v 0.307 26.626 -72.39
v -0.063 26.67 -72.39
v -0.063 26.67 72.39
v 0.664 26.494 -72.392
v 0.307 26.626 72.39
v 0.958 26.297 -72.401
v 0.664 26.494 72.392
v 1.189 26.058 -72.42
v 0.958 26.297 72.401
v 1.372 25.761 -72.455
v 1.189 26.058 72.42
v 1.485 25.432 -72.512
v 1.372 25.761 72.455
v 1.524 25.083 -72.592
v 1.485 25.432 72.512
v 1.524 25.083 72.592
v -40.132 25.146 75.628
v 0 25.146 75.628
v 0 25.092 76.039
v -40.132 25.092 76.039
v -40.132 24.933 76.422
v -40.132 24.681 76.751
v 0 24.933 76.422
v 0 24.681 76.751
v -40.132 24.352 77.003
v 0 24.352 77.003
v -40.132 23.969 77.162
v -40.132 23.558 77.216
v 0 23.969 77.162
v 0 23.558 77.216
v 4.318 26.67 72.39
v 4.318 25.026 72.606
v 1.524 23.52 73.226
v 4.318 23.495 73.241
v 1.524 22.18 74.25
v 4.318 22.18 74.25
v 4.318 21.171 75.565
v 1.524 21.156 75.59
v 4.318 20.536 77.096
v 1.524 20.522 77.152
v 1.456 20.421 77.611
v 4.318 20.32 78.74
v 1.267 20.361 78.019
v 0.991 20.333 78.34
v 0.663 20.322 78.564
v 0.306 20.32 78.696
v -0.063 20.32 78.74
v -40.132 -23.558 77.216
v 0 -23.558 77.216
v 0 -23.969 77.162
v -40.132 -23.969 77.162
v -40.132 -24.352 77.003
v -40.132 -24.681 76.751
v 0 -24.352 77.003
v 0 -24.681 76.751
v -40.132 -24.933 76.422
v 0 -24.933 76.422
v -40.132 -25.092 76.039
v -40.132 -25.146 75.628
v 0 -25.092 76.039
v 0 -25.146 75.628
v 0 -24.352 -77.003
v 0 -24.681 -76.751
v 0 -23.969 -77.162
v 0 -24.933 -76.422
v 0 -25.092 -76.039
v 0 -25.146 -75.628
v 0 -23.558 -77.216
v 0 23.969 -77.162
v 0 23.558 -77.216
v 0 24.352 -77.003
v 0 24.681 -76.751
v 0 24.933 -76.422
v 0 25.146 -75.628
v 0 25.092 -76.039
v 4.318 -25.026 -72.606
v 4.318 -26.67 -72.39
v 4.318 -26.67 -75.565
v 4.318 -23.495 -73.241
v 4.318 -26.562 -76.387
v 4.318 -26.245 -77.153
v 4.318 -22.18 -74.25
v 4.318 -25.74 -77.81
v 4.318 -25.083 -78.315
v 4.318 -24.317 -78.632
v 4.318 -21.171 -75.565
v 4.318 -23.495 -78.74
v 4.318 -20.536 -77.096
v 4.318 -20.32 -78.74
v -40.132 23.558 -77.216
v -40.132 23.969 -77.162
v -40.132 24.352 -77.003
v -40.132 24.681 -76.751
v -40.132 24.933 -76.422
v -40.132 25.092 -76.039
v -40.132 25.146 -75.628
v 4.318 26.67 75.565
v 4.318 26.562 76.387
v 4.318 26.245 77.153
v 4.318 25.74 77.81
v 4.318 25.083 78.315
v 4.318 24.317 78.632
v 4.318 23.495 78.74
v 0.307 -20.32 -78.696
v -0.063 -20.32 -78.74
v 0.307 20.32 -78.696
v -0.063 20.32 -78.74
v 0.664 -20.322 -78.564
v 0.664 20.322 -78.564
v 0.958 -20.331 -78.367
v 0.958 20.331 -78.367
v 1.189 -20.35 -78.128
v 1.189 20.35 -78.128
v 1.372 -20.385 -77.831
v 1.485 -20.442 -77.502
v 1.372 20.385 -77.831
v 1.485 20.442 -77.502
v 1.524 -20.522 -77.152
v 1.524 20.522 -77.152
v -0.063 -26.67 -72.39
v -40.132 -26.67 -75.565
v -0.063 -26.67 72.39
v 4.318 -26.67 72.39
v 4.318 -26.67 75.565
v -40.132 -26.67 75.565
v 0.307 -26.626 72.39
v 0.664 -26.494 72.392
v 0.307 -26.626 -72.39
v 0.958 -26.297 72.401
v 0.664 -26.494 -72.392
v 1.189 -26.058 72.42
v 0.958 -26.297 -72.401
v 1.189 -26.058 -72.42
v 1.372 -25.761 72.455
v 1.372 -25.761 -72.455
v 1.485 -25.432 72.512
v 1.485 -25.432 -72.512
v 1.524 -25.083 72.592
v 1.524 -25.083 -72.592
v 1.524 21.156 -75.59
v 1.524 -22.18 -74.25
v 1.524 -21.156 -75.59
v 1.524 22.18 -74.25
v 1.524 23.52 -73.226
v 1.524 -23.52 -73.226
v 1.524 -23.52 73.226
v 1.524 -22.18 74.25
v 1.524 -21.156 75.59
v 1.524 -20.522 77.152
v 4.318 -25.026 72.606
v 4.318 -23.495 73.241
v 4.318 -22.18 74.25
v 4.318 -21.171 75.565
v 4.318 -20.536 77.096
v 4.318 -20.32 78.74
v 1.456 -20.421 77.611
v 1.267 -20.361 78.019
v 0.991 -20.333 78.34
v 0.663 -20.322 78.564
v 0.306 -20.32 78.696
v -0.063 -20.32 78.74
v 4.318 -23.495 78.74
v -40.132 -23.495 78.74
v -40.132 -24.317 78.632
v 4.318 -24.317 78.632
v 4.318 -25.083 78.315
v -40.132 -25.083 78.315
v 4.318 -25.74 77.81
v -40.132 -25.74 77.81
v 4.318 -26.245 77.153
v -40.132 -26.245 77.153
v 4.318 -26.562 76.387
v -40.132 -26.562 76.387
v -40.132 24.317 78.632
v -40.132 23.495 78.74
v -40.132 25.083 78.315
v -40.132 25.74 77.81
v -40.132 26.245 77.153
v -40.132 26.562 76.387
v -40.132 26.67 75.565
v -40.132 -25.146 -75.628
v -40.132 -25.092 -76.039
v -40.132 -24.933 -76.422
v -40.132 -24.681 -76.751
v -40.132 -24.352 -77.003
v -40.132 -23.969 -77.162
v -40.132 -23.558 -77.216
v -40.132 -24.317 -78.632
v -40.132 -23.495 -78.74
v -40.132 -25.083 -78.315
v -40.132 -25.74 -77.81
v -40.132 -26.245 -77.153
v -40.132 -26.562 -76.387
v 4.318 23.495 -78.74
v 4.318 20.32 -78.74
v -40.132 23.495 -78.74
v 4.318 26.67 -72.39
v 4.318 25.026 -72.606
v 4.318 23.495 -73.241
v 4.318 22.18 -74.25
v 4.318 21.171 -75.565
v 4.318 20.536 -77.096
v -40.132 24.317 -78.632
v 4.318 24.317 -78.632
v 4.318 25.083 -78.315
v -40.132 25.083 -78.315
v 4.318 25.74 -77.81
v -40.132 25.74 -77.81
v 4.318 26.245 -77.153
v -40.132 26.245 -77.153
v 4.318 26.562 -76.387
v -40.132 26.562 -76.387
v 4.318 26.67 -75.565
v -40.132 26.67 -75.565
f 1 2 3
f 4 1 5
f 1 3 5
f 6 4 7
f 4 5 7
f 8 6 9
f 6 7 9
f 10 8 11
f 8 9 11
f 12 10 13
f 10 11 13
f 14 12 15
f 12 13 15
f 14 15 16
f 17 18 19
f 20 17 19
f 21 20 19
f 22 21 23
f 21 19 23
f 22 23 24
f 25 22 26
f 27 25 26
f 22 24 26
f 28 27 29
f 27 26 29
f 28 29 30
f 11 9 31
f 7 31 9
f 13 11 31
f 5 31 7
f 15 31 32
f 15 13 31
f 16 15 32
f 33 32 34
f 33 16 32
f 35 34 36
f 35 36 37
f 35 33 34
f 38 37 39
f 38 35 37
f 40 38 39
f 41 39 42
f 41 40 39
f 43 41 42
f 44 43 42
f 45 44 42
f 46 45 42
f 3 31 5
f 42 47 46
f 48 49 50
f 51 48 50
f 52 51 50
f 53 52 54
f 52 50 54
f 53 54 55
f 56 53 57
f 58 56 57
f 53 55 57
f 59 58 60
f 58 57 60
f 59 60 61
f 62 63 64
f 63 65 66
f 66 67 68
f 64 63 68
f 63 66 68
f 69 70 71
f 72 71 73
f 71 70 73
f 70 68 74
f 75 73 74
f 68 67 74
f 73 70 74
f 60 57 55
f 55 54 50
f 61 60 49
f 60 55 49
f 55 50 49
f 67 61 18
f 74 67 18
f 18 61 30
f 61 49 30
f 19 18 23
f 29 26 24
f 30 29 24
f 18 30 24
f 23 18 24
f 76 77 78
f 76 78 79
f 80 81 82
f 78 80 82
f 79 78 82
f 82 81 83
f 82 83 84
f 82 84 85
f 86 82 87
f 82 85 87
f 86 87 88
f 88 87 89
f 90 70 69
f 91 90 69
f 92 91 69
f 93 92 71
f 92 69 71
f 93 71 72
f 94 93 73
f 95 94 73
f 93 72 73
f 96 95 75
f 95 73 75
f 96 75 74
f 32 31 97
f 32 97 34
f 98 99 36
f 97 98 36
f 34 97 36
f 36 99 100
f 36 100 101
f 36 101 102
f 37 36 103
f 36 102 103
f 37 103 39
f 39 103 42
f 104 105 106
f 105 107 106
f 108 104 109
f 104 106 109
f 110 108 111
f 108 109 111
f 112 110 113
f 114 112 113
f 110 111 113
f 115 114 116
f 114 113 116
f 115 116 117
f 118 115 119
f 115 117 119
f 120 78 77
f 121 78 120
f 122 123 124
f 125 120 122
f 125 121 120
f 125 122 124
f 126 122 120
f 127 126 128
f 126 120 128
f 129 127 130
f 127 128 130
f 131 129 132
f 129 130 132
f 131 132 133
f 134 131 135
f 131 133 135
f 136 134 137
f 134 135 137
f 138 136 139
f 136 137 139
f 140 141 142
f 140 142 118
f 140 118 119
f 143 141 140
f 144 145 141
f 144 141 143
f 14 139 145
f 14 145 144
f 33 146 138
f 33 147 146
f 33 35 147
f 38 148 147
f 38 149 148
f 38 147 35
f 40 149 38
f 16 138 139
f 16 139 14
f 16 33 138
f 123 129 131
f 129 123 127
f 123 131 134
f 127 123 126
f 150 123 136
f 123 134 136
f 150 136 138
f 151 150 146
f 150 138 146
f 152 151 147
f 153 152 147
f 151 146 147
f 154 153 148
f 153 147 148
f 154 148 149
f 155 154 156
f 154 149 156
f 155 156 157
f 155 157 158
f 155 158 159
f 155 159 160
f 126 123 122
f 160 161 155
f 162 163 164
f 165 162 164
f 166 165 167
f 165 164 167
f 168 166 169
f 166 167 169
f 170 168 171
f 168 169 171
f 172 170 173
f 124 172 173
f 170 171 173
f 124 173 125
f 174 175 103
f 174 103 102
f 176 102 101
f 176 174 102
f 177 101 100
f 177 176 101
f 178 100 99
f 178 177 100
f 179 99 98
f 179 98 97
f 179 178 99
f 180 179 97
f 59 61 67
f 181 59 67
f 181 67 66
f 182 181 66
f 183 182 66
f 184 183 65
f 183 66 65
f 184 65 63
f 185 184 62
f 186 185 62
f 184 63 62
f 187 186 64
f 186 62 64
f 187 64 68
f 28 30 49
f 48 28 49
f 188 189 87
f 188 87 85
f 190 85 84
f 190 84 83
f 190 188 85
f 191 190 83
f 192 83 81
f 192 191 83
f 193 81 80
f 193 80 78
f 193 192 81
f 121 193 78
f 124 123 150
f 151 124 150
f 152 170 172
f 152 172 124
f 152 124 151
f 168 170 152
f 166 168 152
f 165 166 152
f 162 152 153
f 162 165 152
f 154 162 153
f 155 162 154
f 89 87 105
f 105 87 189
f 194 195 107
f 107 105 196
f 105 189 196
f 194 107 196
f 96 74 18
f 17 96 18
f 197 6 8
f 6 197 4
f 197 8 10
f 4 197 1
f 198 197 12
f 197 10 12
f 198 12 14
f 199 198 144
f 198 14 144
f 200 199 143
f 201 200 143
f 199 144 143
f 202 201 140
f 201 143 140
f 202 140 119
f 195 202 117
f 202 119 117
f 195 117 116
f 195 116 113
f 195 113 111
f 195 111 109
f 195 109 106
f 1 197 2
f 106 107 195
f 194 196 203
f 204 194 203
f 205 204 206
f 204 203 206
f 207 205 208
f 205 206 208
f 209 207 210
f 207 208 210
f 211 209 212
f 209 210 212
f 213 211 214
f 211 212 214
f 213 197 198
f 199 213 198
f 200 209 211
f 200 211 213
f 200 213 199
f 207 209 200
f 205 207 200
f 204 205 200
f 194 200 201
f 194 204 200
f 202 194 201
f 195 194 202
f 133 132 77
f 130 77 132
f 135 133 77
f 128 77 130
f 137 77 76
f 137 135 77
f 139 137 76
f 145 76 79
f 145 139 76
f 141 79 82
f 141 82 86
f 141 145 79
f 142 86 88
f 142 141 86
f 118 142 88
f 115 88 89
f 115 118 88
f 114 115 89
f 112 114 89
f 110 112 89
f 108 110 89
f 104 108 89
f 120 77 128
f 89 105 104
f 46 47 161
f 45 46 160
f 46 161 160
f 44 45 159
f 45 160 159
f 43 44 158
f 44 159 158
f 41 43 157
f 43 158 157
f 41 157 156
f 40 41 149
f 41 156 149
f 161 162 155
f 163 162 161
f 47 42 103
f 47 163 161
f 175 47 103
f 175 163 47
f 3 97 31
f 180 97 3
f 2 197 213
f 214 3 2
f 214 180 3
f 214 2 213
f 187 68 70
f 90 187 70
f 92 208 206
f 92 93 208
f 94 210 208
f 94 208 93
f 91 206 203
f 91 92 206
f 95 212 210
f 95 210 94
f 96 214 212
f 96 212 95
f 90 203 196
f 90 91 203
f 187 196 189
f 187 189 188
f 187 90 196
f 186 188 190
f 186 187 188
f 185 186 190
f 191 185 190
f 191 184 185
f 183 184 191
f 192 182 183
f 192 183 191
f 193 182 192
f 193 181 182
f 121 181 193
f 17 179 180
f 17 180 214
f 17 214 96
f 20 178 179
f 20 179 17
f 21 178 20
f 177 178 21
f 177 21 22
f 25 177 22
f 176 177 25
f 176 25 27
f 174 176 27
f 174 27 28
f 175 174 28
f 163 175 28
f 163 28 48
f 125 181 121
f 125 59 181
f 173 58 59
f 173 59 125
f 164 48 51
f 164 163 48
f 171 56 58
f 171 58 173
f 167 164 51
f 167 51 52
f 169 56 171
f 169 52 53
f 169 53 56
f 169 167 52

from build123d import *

# Parameters (mm, degrees)
F1_DEPTH = 1.524
F3_DEPTH = 40.132
F5_DEPTH = 2.794
F8_R     = 1.5875
F9_R     = 1.5875
F10_R    = 1.5875
F11_R    = 1.5875


with BuildPart() as f1:
    # F0 (on Right) → F1 (new body)
    with BuildSketch(Plane.YZ):
        with BuildLine():
            ThreePointArc((26.67, 75.565), (25.7400640303, 77.8100640303), (23.495, 78.74))
            Line((23.495, 78.74), (-23.495, 78.74))
            ThreePointArc((-23.495, 78.74), (-25.7400640303, 77.8100640303), (-26.67, 75.565))
            Line((-26.67, 75.565), (-26.67, -75.565))
            ThreePointArc((-26.67, -75.565), (-25.7400640303, -77.8100640303), (-23.495, -78.74))
            Line((-23.495, -78.74), (23.495, -78.74))
            ThreePointArc((23.495, -78.74), (25.7400640303, -77.8100640303), (26.67, -75.565))
            Line((26.67, -75.565), (26.67, 75.565))
        make_face()
    extrude(amount=F1_DEPTH)

    # F2 (on face) → F3 (join)
    with BuildSketch(Plane(origin=(0, 0, 0), x_dir=(0, -1, 0), z_dir=(-1, 0, 0))):
        with BuildLine():
            Line((23.495, 78.74), (-23.495, 78.74))
            ThreePointArc((-23.495, 78.74), (-25.7400640303, 77.8100640303), (-26.67, 75.565))
            Line((-26.67, 75.565), (-26.67, -75.565))
            ThreePointArc((-26.67, -75.565), (-25.7400640303, -77.8100640303), (-23.495, -78.74))
            Line((-23.495, -78.74), (23.495, -78.74))
            ThreePointArc((23.495, -78.74), (25.7400640303, -77.8100640303), (26.67, -75.565))
            Line((26.67, -75.565), (26.67, 75.565))
            ThreePointArc((26.67, 75.565), (25.7400640303, 77.8100640303), (23.495, 78.74))
        make_face()
        with BuildLine():
            ThreePointArc((25.146, -75.6285), (24.6810320151, -76.7510320151), (23.5585, -77.216))
            Line((23.5585, -77.216), (-23.5585, -77.216))
            ThreePointArc((-23.5585, -77.216), (-24.6810320151, -76.7510320151), (-25.146, -75.6285))
            Line((-25.146, -75.6285), (-25.146, 75.6285))
            ThreePointArc((-25.146, 75.6285), (-24.6810320151, 76.7510320151), (-23.5585, 77.216))
            Line((-23.5585, 77.216), (23.5585, 77.216))
            ThreePointArc((23.5585, 77.216), (24.6810320151, 76.7510320151), (25.146, 75.6285))
            Line((25.146, 75.6285), (25.146, -75.6285))
        make_face(mode=Mode.SUBTRACT)
    extrude(amount=F3_DEPTH)

    # F4 (on face) → F5 (join)
    with BuildSketch(Plane.YZ.offset(1.524)):
        with BuildLine():
            ThreePointArc((-26.67, 72.39), (-22.1798719395, 74.2498719395), (-20.32, 78.74))
            Line((-20.32, 78.74), (-23.495, 78.74))
            ThreePointArc((-23.495, 78.74), (-25.7400640303, 77.8100640303), (-26.67, 75.565))
            Line((-26.67, 75.565), (-26.67, 72.39))
        make_face()
    extrude(amount=F5_DEPTH)


with BuildPart() as f6_1:
    # F6: instance of F1
    add(f1.part.mirror(Plane.XY))


with BuildPart() as f1_1:
    add(f1.part)

    add(f6_1.part)  # F7 merges F6_1
    # F7: F6_1, F1 across plane
    add(f6_1.part.mirror(Plane.XZ))
    add(f1.part.mirror(Plane.XZ))

    # F8
    f8_edges = [f1_1.edges().sort_by_distance(p)[0] for p in [
        (1.524, -26.67, 0),
    ]]
    fillet(f8_edges, radius=F8_R)

    # F9
    f9_edges = [f1_1.edges().sort_by_distance(p)[0] for p in [
        (1.524, 0, -78.74),
    ]]
    fillet(f9_edges, radius=F9_R)

    # F10
    f10_edges = [f1_1.edges().sort_by_distance(p)[0] for p in [
        (1.524, 26.67, 0),
    ]]
    fillet(f10_edges, radius=F10_R)

    # F11
    f11_edges = [f1_1.edges().sort_by_distance(p)[0] for p in [
        (1.524, 0, 78.74),
    ]]
    fillet(f11_edges, radius=F11_R)


solid = f1_1.part
